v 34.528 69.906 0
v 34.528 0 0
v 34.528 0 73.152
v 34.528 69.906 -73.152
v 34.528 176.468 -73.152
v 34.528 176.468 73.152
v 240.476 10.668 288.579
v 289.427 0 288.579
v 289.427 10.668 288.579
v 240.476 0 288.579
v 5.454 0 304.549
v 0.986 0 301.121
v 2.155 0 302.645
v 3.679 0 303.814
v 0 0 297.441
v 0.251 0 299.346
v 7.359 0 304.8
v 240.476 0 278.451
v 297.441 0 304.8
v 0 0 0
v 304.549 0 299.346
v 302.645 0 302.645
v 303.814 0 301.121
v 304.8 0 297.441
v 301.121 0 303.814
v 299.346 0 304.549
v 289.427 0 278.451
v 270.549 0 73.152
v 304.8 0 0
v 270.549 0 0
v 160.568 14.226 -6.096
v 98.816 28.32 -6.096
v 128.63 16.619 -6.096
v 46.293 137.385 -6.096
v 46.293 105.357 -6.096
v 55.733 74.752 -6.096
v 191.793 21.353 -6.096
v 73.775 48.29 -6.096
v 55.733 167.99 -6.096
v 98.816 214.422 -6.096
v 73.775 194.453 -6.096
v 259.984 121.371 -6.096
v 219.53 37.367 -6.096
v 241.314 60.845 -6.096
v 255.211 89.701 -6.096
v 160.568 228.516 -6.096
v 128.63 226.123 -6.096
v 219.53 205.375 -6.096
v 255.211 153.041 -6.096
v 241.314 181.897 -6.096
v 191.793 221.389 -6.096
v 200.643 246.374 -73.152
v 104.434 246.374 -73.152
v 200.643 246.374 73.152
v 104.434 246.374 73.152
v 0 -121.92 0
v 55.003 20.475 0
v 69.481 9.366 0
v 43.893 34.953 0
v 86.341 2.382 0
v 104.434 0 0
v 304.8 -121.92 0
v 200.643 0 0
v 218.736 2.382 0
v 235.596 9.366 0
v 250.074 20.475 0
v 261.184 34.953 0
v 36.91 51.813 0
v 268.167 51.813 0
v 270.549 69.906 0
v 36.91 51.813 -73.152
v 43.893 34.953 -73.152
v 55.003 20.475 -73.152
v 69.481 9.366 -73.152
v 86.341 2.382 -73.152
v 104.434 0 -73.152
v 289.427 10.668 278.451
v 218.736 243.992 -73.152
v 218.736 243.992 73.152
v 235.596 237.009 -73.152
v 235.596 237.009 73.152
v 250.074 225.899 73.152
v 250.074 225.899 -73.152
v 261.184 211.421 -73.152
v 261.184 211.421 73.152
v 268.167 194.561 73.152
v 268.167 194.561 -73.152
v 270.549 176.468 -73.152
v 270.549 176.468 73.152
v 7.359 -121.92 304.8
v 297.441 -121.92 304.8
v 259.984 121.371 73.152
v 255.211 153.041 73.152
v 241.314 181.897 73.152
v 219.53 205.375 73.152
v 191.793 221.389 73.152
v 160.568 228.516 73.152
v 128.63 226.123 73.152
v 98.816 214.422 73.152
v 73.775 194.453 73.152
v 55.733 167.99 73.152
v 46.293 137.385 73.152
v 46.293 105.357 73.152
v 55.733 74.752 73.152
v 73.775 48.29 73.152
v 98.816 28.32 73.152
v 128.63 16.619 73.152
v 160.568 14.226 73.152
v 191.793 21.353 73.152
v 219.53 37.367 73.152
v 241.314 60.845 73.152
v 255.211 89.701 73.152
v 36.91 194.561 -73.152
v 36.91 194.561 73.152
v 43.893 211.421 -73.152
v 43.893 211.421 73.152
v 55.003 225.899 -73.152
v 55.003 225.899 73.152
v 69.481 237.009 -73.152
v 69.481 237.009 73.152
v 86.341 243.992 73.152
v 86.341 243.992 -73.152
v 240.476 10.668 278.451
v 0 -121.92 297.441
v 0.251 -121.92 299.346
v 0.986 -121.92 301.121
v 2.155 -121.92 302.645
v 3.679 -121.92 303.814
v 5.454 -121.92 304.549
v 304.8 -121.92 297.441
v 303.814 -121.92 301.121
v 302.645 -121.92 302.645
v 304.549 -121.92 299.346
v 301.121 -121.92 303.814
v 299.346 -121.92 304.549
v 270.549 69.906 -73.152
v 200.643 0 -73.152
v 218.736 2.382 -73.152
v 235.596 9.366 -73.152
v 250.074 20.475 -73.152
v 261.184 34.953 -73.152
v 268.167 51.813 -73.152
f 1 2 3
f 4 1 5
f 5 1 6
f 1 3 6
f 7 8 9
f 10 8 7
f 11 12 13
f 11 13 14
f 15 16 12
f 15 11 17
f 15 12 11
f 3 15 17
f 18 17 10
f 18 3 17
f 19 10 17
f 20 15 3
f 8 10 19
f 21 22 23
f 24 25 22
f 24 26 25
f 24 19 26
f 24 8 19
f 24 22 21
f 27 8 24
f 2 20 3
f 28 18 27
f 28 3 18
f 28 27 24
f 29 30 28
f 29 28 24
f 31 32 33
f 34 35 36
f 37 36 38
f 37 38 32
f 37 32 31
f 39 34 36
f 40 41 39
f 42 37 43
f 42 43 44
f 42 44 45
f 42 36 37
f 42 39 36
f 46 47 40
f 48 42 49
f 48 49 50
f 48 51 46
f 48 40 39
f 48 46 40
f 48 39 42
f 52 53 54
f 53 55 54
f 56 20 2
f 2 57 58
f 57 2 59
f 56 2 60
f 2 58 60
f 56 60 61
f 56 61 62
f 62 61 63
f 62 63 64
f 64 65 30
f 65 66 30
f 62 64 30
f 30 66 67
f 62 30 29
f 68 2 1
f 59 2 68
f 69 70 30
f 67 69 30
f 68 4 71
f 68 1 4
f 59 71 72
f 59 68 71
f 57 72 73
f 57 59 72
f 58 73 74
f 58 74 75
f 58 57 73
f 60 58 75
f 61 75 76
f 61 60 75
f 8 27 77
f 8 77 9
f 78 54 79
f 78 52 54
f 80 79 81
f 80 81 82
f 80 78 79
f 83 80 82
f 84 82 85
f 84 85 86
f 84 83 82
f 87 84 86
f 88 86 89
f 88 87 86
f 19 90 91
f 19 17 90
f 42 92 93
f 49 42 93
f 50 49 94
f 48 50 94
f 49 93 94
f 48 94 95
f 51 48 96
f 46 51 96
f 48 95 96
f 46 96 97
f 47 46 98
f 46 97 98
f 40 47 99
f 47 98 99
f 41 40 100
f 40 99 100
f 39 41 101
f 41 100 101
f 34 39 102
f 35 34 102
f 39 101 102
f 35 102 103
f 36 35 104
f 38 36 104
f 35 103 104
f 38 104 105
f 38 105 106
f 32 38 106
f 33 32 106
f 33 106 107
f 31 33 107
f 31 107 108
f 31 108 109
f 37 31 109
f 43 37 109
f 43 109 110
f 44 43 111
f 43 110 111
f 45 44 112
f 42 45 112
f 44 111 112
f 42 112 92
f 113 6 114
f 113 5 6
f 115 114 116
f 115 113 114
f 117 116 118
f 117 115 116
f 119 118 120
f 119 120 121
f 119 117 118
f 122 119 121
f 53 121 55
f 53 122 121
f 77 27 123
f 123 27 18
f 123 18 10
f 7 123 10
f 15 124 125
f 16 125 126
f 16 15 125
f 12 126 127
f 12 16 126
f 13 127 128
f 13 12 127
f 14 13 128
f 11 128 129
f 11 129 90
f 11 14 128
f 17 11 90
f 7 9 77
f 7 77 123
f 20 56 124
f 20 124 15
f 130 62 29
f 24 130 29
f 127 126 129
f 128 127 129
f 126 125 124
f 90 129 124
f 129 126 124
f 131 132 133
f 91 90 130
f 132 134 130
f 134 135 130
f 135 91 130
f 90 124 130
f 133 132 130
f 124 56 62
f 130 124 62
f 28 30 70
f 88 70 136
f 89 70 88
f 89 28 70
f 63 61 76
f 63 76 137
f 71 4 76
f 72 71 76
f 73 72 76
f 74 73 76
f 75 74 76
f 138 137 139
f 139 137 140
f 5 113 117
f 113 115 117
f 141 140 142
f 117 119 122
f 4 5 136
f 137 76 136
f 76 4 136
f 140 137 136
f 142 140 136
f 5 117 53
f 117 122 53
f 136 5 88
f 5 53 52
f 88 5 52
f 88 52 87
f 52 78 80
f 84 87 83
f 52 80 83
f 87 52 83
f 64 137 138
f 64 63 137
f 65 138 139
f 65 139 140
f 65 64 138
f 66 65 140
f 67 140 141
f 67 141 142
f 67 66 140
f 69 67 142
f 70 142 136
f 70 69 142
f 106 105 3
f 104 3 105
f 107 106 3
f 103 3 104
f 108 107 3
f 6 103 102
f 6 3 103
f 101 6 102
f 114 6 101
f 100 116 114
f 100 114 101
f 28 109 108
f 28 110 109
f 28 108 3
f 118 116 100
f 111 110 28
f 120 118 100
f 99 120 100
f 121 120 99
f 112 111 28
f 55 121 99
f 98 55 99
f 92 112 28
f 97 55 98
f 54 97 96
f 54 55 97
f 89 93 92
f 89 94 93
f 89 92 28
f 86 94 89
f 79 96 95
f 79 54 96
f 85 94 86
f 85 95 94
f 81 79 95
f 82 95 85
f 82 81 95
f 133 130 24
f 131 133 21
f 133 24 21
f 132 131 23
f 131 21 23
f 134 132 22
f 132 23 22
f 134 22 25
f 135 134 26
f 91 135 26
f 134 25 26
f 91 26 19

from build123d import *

# Parameters (mm, degrees)
F0_W     = 304.8
F0_H     = 121.92
F1_DEPTH = 304.8
F2_W     = 236.021310091
F2_H     = 246.3743686676
F3_DEPTH = 73.152
F4_R     = 69.9059679121
F5_R     = 107.4455989459
F6_DEPTH = 79.248
F7_R     = 7.3585229381
F8_W     = 48.9512532949
F8_H     = 10.1278424263
F9_DEPTH = 10.668


with BuildPart() as f1:
    # F0 (on Top) → F1 (new body)
    with BuildSketch(Plane.XY):
        with Locations((152.4, -60.96)):
            Rectangle(F0_W, F0_H)
    extrude(amount=F1_DEPTH)

    # F2 (on Top) → F3 (join, symmetric)
    with BuildSketch(Plane.XY):
        with Locations((152.538523078, 123.1871843338)):
            Rectangle(F2_W, F2_H)
    extrude(amount=F3_DEPTH, both=True)

    # F4
    f4_edges = [f1.edges().sort_by_distance(p)[0] for p in [
        (34.527868, 246.374369, 0),
        (270.549178, 246.374369, 0),
        (34.527868, 0, -36.576),
        (270.549178, 0, -36.576),
    ]]
    fillet(f4_edges, radius=F4_R)

    # F5 (on face) → F6 (cut)
    with BuildSketch(Plane.XY.offset(73.152)):
        with Locations((152.538523078, 121.3710904121)):
            Circle(F5_R)
    extrude(amount=-F6_DEPTH, mode=Mode.SUBTRACT)

    # F7
    f7_edges = [f1.edges().sort_by_distance(p)[0] for p in [
        (304.8, -60.96, 304.8),
        (0, -60.96, 304.8),
    ]]
    fillet(f7_edges, radius=F7_R)

    # F8 (on face) → F9 (join)
    with BuildSketch(Plane(origin=(0, 0, 0), x_dir=(-1, 0, 0), z_dir=(0, 1, 0))):
        with Locations((-264.9517431855, 283.5146784782)):
            Rectangle(F8_W, F8_H)
    extrude(amount=F9_DEPTH)


solid = f1.part
